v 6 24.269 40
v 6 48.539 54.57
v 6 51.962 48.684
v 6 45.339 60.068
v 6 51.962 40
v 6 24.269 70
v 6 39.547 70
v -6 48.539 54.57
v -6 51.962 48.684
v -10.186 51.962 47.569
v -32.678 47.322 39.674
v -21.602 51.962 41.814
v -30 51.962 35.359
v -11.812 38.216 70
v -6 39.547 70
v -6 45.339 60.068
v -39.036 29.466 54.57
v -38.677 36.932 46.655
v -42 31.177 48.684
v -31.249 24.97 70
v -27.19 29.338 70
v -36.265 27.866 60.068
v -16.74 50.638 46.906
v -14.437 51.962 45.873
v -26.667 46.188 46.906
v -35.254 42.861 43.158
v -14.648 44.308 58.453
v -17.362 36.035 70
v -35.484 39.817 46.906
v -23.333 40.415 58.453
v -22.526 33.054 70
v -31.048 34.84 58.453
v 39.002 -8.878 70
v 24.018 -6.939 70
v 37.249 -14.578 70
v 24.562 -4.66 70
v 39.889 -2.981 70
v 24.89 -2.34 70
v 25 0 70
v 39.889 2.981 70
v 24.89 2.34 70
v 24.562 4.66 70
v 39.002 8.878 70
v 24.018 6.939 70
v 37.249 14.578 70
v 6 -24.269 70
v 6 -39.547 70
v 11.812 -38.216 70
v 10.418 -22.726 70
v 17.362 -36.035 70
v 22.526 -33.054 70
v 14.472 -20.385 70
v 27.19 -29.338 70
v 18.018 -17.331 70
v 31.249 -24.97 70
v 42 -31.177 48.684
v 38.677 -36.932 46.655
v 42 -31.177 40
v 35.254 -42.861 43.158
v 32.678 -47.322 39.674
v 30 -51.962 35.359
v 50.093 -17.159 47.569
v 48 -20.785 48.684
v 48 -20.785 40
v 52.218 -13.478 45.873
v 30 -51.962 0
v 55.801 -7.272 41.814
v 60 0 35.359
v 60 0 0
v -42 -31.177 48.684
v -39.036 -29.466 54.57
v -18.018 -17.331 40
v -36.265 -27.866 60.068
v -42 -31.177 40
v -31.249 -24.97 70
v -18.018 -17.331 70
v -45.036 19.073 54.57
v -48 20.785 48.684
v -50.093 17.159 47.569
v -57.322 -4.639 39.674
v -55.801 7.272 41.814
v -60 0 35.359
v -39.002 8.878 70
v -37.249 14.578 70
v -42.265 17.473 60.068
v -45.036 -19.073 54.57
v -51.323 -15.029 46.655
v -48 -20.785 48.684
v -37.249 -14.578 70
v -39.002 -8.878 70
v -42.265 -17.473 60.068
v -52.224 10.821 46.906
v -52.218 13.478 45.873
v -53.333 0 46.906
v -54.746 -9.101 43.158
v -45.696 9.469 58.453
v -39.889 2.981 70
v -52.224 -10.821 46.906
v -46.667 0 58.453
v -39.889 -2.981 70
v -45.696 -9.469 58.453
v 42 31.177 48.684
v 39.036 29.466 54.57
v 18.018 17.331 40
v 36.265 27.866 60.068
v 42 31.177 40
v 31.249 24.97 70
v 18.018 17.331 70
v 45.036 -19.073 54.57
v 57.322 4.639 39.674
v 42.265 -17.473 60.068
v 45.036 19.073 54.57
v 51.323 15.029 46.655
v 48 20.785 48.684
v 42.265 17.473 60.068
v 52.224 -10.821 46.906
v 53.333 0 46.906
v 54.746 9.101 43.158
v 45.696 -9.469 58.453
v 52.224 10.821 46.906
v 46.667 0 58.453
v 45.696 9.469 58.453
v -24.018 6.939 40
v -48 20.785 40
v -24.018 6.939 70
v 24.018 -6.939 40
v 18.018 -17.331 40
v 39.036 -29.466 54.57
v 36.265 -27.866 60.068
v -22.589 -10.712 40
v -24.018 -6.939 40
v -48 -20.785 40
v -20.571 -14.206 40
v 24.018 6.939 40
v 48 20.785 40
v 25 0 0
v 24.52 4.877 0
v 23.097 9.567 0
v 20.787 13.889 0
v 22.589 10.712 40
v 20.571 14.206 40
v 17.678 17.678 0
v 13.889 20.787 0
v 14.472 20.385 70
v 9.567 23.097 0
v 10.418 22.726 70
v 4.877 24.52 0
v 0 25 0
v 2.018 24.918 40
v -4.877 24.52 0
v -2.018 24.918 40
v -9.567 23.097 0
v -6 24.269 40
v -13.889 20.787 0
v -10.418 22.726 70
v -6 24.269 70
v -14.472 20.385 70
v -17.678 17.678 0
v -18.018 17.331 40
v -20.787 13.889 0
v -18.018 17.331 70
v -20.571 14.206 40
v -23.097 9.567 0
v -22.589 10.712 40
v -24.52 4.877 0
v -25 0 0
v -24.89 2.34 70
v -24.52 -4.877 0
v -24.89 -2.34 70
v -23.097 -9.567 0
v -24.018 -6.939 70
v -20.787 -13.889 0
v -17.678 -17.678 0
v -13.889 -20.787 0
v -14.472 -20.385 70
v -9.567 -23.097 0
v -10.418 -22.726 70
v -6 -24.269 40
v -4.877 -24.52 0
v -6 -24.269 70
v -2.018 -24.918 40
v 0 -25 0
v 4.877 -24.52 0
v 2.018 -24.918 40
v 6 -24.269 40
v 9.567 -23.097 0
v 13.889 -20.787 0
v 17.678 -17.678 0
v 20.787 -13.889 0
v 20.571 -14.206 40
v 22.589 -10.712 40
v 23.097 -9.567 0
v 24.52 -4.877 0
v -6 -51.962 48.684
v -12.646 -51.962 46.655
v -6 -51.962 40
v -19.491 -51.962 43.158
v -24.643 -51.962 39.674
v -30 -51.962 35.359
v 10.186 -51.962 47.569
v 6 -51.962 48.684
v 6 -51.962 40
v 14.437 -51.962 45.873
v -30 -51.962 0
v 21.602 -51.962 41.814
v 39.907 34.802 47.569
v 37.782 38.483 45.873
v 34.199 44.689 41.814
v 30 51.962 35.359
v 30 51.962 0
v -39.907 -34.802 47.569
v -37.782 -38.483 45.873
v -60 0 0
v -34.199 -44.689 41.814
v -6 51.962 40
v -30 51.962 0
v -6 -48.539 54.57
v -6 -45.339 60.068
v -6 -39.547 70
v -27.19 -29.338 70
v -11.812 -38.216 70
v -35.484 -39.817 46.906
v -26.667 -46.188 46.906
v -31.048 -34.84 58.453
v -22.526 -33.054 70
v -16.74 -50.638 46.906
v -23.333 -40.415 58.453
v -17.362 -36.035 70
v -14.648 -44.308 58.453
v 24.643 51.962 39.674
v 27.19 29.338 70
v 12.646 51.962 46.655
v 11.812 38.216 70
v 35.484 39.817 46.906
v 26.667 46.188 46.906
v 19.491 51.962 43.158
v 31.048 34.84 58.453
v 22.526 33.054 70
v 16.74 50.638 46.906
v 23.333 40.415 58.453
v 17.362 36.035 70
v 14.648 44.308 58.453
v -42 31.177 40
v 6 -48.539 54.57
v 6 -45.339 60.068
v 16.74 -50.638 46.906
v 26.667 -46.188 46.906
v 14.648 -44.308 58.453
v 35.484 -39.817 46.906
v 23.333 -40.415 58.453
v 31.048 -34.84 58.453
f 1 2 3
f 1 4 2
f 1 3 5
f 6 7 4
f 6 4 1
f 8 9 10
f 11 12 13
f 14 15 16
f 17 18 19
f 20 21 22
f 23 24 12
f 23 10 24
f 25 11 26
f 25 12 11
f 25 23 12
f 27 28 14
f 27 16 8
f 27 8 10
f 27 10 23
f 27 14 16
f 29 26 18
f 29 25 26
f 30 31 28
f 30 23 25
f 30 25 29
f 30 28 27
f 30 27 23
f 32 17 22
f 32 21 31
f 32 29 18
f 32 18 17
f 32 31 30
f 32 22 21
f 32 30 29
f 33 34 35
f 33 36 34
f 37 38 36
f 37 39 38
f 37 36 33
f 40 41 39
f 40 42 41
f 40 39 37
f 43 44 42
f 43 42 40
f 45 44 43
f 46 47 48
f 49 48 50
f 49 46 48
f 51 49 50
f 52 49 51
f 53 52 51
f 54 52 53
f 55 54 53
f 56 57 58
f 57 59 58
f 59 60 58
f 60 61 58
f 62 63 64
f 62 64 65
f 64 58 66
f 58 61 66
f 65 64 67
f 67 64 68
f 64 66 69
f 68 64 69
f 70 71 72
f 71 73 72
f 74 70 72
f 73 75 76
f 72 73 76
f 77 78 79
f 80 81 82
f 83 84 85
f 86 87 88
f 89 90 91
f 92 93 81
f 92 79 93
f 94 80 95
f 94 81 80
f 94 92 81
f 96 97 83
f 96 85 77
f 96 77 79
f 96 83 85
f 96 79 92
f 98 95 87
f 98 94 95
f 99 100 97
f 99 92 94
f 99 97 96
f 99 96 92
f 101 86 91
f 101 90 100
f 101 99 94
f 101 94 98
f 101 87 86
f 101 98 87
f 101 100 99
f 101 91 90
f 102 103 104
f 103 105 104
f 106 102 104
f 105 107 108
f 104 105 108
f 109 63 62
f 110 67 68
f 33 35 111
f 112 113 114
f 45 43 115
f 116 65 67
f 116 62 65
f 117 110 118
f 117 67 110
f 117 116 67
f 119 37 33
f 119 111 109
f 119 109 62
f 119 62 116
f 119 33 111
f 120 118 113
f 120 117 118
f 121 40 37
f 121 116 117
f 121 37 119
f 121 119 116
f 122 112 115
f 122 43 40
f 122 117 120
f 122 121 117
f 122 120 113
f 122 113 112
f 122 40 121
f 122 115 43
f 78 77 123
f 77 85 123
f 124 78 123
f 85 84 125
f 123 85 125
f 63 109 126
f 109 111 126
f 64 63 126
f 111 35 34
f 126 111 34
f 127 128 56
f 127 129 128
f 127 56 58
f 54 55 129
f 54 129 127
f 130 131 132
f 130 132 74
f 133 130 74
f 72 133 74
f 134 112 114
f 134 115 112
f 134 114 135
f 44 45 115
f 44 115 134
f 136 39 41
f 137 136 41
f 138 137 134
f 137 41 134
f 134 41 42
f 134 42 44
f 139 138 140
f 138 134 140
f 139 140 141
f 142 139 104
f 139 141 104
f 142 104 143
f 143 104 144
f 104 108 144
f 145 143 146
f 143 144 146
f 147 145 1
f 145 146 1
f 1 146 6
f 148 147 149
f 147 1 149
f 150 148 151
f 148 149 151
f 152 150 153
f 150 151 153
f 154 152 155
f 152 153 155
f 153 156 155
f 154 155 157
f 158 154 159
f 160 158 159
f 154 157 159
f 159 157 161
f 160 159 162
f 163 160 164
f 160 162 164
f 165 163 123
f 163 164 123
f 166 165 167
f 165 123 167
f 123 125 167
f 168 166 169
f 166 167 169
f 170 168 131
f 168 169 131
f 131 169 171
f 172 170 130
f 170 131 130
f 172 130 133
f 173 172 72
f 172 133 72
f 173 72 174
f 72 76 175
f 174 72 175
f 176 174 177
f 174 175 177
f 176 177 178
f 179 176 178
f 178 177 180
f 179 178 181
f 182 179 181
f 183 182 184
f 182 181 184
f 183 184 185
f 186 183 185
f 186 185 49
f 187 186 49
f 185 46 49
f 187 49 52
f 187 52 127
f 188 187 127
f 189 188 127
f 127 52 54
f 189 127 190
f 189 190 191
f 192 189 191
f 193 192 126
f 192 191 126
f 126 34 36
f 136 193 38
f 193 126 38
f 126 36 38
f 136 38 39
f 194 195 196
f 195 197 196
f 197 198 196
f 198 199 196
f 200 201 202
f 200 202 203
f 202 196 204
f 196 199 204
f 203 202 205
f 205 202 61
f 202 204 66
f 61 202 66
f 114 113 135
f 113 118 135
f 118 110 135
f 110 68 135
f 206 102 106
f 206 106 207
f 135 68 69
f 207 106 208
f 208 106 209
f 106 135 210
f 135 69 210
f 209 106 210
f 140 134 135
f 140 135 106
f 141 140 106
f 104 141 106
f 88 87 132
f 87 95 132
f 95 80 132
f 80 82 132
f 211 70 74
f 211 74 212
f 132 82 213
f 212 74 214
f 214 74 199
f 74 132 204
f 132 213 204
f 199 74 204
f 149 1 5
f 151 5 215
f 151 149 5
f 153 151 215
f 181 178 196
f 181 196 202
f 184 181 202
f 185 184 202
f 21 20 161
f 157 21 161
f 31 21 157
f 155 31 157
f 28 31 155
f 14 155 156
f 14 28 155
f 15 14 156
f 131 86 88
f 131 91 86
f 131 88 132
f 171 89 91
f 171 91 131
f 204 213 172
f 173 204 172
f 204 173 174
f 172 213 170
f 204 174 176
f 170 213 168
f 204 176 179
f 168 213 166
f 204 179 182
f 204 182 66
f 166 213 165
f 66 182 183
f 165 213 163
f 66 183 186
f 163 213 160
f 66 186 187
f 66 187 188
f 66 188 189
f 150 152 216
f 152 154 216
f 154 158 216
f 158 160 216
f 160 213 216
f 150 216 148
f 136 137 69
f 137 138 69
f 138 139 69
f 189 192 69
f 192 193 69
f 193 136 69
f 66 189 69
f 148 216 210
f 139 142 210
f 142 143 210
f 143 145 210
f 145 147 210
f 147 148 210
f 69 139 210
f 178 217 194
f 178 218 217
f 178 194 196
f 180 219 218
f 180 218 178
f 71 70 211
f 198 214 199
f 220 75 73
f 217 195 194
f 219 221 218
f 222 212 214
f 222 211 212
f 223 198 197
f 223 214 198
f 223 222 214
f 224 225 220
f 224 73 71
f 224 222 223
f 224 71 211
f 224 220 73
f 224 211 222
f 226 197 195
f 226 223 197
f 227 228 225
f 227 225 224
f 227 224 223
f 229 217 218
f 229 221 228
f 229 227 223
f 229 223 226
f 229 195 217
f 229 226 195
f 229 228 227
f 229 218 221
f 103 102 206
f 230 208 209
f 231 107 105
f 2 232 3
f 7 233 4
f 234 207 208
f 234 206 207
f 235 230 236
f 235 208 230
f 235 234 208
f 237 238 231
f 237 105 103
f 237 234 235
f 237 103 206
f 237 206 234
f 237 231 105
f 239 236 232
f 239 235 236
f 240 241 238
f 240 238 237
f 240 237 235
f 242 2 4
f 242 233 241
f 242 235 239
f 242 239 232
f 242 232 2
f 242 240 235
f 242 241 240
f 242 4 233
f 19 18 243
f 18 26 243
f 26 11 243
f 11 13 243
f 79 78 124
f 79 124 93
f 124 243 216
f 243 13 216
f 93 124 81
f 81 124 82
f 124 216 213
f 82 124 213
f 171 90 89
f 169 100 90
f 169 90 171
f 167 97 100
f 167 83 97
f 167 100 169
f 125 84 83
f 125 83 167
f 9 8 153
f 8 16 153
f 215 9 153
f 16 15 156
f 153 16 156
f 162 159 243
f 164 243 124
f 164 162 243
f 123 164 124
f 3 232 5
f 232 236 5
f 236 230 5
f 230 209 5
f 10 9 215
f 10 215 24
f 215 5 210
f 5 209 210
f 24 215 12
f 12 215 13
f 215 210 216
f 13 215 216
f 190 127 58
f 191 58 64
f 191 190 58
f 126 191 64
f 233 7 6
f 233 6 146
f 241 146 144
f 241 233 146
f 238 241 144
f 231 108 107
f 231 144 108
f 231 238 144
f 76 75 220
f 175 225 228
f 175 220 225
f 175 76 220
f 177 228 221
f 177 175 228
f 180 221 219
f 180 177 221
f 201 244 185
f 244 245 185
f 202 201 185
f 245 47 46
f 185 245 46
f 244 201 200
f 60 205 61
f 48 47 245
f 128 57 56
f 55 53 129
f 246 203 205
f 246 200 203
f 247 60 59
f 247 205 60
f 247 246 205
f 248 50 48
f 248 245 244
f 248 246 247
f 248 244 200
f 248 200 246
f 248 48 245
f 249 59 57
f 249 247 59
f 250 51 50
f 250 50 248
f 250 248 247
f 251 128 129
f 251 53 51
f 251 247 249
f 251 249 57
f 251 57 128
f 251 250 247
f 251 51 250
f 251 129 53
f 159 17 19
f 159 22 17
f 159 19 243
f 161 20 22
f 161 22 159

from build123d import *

# Parameters (mm, degrees)
BOSS_EXTRUDE1_DEPTH = 70
SKETCH2_R           = 25
CUT_EXTRUDE1_DEPTH  = 106.830052443
SKETCH3_OUTSIDE_W   = 237.528
SKETCH3_OUTSIDE_H   = 221.452
SKETCH3_OUTSIDE_R   = 40
CUT_EXTRUDE2_DEPTH  = 70
CUT_EXTRUDE2_DRAFT  = -30
SKETCH6_W           = 12
SKETCH6_H           = 28.841258608
CUT_EXTRUDE3_DEPTH  = 30
CIRPATTERN1_COUNT   = 6


with BuildPart() as part:
    # Sketch1 → Boss-Extrude1 (new body)
    with BuildSketch(Plane.XY):
        Polygon((60, 0), (30, 51.961524227), (-30, 51.961524227), (-60, 0), (-30, -51.961524227), (30, -51.961524227), align=None)
    extrude(amount=BOSS_EXTRUDE1_DEPTH)

    # Sketch2 → Cut-Extrude1 (cut, through all)
    with BuildSketch(Plane.XY.offset(70)):
        Circle(SKETCH2_R)
    extrude(amount=-CUT_EXTRUDE1_DEPTH, mode=Mode.SUBTRACT)


with BuildPart() as cut_extrude2_tool:
    # Sketch3 outside → Cut-Extrude2 (with draft: the straight prism first)
    with BuildSketch(Plane.XY.offset(70)):
        Rectangle(SKETCH3_OUTSIDE_W, SKETCH3_OUTSIDE_H)
        Circle(SKETCH3_OUTSIDE_R, mode=Mode.SUBTRACT)
    extrude(amount=-CUT_EXTRUDE2_DEPTH)
    # Cut-Extrude2: the draft: its side faces are tilted about the plane it starts from
    cut_extrude2_sides = [cut_extrude2_tool.faces().sort_by_distance(p)[0] for p in [
        (0, -110.726, 35),
        (118.764, 0, 35),
        (0, 110.726, 35),
        (-118.764, 0, 35),
        (-40, 0, 35),
    ]]
    draft(cut_extrude2_sides, Plane.XY.offset(70), CUT_EXTRUDE2_DRAFT)


with BuildPart() as part_1:
    add(part.part)

    # Cut-Extrude2: cut by cut_extrude2_tool
    add(cut_extrude2_tool.part, mode=Mode.SUBTRACT)

    # Sketch6 → Cut-Extrude3 (cut)
    with BuildSketch(Plane.XY.offset(70)):
        with Locations((0, -38.689951503)):
            Rectangle(SKETCH6_W, SKETCH6_H)
    cut_extrude3 = extrude(amount=-CUT_EXTRUDE3_DEPTH, mode=Mode.SUBTRACT)

    # CirPattern1: Cut-Extrude3 ×6 about axis
    cirpattern1_axis = Axis((0, 0, 0), (0, 0, 1))
    for i in range(1, CIRPATTERN1_COUNT):
        add(cut_extrude3.rotate(cirpattern1_axis, i * 360 / CIRPATTERN1_COUNT), mode=Mode.SUBTRACT)


solid = part_1.part
